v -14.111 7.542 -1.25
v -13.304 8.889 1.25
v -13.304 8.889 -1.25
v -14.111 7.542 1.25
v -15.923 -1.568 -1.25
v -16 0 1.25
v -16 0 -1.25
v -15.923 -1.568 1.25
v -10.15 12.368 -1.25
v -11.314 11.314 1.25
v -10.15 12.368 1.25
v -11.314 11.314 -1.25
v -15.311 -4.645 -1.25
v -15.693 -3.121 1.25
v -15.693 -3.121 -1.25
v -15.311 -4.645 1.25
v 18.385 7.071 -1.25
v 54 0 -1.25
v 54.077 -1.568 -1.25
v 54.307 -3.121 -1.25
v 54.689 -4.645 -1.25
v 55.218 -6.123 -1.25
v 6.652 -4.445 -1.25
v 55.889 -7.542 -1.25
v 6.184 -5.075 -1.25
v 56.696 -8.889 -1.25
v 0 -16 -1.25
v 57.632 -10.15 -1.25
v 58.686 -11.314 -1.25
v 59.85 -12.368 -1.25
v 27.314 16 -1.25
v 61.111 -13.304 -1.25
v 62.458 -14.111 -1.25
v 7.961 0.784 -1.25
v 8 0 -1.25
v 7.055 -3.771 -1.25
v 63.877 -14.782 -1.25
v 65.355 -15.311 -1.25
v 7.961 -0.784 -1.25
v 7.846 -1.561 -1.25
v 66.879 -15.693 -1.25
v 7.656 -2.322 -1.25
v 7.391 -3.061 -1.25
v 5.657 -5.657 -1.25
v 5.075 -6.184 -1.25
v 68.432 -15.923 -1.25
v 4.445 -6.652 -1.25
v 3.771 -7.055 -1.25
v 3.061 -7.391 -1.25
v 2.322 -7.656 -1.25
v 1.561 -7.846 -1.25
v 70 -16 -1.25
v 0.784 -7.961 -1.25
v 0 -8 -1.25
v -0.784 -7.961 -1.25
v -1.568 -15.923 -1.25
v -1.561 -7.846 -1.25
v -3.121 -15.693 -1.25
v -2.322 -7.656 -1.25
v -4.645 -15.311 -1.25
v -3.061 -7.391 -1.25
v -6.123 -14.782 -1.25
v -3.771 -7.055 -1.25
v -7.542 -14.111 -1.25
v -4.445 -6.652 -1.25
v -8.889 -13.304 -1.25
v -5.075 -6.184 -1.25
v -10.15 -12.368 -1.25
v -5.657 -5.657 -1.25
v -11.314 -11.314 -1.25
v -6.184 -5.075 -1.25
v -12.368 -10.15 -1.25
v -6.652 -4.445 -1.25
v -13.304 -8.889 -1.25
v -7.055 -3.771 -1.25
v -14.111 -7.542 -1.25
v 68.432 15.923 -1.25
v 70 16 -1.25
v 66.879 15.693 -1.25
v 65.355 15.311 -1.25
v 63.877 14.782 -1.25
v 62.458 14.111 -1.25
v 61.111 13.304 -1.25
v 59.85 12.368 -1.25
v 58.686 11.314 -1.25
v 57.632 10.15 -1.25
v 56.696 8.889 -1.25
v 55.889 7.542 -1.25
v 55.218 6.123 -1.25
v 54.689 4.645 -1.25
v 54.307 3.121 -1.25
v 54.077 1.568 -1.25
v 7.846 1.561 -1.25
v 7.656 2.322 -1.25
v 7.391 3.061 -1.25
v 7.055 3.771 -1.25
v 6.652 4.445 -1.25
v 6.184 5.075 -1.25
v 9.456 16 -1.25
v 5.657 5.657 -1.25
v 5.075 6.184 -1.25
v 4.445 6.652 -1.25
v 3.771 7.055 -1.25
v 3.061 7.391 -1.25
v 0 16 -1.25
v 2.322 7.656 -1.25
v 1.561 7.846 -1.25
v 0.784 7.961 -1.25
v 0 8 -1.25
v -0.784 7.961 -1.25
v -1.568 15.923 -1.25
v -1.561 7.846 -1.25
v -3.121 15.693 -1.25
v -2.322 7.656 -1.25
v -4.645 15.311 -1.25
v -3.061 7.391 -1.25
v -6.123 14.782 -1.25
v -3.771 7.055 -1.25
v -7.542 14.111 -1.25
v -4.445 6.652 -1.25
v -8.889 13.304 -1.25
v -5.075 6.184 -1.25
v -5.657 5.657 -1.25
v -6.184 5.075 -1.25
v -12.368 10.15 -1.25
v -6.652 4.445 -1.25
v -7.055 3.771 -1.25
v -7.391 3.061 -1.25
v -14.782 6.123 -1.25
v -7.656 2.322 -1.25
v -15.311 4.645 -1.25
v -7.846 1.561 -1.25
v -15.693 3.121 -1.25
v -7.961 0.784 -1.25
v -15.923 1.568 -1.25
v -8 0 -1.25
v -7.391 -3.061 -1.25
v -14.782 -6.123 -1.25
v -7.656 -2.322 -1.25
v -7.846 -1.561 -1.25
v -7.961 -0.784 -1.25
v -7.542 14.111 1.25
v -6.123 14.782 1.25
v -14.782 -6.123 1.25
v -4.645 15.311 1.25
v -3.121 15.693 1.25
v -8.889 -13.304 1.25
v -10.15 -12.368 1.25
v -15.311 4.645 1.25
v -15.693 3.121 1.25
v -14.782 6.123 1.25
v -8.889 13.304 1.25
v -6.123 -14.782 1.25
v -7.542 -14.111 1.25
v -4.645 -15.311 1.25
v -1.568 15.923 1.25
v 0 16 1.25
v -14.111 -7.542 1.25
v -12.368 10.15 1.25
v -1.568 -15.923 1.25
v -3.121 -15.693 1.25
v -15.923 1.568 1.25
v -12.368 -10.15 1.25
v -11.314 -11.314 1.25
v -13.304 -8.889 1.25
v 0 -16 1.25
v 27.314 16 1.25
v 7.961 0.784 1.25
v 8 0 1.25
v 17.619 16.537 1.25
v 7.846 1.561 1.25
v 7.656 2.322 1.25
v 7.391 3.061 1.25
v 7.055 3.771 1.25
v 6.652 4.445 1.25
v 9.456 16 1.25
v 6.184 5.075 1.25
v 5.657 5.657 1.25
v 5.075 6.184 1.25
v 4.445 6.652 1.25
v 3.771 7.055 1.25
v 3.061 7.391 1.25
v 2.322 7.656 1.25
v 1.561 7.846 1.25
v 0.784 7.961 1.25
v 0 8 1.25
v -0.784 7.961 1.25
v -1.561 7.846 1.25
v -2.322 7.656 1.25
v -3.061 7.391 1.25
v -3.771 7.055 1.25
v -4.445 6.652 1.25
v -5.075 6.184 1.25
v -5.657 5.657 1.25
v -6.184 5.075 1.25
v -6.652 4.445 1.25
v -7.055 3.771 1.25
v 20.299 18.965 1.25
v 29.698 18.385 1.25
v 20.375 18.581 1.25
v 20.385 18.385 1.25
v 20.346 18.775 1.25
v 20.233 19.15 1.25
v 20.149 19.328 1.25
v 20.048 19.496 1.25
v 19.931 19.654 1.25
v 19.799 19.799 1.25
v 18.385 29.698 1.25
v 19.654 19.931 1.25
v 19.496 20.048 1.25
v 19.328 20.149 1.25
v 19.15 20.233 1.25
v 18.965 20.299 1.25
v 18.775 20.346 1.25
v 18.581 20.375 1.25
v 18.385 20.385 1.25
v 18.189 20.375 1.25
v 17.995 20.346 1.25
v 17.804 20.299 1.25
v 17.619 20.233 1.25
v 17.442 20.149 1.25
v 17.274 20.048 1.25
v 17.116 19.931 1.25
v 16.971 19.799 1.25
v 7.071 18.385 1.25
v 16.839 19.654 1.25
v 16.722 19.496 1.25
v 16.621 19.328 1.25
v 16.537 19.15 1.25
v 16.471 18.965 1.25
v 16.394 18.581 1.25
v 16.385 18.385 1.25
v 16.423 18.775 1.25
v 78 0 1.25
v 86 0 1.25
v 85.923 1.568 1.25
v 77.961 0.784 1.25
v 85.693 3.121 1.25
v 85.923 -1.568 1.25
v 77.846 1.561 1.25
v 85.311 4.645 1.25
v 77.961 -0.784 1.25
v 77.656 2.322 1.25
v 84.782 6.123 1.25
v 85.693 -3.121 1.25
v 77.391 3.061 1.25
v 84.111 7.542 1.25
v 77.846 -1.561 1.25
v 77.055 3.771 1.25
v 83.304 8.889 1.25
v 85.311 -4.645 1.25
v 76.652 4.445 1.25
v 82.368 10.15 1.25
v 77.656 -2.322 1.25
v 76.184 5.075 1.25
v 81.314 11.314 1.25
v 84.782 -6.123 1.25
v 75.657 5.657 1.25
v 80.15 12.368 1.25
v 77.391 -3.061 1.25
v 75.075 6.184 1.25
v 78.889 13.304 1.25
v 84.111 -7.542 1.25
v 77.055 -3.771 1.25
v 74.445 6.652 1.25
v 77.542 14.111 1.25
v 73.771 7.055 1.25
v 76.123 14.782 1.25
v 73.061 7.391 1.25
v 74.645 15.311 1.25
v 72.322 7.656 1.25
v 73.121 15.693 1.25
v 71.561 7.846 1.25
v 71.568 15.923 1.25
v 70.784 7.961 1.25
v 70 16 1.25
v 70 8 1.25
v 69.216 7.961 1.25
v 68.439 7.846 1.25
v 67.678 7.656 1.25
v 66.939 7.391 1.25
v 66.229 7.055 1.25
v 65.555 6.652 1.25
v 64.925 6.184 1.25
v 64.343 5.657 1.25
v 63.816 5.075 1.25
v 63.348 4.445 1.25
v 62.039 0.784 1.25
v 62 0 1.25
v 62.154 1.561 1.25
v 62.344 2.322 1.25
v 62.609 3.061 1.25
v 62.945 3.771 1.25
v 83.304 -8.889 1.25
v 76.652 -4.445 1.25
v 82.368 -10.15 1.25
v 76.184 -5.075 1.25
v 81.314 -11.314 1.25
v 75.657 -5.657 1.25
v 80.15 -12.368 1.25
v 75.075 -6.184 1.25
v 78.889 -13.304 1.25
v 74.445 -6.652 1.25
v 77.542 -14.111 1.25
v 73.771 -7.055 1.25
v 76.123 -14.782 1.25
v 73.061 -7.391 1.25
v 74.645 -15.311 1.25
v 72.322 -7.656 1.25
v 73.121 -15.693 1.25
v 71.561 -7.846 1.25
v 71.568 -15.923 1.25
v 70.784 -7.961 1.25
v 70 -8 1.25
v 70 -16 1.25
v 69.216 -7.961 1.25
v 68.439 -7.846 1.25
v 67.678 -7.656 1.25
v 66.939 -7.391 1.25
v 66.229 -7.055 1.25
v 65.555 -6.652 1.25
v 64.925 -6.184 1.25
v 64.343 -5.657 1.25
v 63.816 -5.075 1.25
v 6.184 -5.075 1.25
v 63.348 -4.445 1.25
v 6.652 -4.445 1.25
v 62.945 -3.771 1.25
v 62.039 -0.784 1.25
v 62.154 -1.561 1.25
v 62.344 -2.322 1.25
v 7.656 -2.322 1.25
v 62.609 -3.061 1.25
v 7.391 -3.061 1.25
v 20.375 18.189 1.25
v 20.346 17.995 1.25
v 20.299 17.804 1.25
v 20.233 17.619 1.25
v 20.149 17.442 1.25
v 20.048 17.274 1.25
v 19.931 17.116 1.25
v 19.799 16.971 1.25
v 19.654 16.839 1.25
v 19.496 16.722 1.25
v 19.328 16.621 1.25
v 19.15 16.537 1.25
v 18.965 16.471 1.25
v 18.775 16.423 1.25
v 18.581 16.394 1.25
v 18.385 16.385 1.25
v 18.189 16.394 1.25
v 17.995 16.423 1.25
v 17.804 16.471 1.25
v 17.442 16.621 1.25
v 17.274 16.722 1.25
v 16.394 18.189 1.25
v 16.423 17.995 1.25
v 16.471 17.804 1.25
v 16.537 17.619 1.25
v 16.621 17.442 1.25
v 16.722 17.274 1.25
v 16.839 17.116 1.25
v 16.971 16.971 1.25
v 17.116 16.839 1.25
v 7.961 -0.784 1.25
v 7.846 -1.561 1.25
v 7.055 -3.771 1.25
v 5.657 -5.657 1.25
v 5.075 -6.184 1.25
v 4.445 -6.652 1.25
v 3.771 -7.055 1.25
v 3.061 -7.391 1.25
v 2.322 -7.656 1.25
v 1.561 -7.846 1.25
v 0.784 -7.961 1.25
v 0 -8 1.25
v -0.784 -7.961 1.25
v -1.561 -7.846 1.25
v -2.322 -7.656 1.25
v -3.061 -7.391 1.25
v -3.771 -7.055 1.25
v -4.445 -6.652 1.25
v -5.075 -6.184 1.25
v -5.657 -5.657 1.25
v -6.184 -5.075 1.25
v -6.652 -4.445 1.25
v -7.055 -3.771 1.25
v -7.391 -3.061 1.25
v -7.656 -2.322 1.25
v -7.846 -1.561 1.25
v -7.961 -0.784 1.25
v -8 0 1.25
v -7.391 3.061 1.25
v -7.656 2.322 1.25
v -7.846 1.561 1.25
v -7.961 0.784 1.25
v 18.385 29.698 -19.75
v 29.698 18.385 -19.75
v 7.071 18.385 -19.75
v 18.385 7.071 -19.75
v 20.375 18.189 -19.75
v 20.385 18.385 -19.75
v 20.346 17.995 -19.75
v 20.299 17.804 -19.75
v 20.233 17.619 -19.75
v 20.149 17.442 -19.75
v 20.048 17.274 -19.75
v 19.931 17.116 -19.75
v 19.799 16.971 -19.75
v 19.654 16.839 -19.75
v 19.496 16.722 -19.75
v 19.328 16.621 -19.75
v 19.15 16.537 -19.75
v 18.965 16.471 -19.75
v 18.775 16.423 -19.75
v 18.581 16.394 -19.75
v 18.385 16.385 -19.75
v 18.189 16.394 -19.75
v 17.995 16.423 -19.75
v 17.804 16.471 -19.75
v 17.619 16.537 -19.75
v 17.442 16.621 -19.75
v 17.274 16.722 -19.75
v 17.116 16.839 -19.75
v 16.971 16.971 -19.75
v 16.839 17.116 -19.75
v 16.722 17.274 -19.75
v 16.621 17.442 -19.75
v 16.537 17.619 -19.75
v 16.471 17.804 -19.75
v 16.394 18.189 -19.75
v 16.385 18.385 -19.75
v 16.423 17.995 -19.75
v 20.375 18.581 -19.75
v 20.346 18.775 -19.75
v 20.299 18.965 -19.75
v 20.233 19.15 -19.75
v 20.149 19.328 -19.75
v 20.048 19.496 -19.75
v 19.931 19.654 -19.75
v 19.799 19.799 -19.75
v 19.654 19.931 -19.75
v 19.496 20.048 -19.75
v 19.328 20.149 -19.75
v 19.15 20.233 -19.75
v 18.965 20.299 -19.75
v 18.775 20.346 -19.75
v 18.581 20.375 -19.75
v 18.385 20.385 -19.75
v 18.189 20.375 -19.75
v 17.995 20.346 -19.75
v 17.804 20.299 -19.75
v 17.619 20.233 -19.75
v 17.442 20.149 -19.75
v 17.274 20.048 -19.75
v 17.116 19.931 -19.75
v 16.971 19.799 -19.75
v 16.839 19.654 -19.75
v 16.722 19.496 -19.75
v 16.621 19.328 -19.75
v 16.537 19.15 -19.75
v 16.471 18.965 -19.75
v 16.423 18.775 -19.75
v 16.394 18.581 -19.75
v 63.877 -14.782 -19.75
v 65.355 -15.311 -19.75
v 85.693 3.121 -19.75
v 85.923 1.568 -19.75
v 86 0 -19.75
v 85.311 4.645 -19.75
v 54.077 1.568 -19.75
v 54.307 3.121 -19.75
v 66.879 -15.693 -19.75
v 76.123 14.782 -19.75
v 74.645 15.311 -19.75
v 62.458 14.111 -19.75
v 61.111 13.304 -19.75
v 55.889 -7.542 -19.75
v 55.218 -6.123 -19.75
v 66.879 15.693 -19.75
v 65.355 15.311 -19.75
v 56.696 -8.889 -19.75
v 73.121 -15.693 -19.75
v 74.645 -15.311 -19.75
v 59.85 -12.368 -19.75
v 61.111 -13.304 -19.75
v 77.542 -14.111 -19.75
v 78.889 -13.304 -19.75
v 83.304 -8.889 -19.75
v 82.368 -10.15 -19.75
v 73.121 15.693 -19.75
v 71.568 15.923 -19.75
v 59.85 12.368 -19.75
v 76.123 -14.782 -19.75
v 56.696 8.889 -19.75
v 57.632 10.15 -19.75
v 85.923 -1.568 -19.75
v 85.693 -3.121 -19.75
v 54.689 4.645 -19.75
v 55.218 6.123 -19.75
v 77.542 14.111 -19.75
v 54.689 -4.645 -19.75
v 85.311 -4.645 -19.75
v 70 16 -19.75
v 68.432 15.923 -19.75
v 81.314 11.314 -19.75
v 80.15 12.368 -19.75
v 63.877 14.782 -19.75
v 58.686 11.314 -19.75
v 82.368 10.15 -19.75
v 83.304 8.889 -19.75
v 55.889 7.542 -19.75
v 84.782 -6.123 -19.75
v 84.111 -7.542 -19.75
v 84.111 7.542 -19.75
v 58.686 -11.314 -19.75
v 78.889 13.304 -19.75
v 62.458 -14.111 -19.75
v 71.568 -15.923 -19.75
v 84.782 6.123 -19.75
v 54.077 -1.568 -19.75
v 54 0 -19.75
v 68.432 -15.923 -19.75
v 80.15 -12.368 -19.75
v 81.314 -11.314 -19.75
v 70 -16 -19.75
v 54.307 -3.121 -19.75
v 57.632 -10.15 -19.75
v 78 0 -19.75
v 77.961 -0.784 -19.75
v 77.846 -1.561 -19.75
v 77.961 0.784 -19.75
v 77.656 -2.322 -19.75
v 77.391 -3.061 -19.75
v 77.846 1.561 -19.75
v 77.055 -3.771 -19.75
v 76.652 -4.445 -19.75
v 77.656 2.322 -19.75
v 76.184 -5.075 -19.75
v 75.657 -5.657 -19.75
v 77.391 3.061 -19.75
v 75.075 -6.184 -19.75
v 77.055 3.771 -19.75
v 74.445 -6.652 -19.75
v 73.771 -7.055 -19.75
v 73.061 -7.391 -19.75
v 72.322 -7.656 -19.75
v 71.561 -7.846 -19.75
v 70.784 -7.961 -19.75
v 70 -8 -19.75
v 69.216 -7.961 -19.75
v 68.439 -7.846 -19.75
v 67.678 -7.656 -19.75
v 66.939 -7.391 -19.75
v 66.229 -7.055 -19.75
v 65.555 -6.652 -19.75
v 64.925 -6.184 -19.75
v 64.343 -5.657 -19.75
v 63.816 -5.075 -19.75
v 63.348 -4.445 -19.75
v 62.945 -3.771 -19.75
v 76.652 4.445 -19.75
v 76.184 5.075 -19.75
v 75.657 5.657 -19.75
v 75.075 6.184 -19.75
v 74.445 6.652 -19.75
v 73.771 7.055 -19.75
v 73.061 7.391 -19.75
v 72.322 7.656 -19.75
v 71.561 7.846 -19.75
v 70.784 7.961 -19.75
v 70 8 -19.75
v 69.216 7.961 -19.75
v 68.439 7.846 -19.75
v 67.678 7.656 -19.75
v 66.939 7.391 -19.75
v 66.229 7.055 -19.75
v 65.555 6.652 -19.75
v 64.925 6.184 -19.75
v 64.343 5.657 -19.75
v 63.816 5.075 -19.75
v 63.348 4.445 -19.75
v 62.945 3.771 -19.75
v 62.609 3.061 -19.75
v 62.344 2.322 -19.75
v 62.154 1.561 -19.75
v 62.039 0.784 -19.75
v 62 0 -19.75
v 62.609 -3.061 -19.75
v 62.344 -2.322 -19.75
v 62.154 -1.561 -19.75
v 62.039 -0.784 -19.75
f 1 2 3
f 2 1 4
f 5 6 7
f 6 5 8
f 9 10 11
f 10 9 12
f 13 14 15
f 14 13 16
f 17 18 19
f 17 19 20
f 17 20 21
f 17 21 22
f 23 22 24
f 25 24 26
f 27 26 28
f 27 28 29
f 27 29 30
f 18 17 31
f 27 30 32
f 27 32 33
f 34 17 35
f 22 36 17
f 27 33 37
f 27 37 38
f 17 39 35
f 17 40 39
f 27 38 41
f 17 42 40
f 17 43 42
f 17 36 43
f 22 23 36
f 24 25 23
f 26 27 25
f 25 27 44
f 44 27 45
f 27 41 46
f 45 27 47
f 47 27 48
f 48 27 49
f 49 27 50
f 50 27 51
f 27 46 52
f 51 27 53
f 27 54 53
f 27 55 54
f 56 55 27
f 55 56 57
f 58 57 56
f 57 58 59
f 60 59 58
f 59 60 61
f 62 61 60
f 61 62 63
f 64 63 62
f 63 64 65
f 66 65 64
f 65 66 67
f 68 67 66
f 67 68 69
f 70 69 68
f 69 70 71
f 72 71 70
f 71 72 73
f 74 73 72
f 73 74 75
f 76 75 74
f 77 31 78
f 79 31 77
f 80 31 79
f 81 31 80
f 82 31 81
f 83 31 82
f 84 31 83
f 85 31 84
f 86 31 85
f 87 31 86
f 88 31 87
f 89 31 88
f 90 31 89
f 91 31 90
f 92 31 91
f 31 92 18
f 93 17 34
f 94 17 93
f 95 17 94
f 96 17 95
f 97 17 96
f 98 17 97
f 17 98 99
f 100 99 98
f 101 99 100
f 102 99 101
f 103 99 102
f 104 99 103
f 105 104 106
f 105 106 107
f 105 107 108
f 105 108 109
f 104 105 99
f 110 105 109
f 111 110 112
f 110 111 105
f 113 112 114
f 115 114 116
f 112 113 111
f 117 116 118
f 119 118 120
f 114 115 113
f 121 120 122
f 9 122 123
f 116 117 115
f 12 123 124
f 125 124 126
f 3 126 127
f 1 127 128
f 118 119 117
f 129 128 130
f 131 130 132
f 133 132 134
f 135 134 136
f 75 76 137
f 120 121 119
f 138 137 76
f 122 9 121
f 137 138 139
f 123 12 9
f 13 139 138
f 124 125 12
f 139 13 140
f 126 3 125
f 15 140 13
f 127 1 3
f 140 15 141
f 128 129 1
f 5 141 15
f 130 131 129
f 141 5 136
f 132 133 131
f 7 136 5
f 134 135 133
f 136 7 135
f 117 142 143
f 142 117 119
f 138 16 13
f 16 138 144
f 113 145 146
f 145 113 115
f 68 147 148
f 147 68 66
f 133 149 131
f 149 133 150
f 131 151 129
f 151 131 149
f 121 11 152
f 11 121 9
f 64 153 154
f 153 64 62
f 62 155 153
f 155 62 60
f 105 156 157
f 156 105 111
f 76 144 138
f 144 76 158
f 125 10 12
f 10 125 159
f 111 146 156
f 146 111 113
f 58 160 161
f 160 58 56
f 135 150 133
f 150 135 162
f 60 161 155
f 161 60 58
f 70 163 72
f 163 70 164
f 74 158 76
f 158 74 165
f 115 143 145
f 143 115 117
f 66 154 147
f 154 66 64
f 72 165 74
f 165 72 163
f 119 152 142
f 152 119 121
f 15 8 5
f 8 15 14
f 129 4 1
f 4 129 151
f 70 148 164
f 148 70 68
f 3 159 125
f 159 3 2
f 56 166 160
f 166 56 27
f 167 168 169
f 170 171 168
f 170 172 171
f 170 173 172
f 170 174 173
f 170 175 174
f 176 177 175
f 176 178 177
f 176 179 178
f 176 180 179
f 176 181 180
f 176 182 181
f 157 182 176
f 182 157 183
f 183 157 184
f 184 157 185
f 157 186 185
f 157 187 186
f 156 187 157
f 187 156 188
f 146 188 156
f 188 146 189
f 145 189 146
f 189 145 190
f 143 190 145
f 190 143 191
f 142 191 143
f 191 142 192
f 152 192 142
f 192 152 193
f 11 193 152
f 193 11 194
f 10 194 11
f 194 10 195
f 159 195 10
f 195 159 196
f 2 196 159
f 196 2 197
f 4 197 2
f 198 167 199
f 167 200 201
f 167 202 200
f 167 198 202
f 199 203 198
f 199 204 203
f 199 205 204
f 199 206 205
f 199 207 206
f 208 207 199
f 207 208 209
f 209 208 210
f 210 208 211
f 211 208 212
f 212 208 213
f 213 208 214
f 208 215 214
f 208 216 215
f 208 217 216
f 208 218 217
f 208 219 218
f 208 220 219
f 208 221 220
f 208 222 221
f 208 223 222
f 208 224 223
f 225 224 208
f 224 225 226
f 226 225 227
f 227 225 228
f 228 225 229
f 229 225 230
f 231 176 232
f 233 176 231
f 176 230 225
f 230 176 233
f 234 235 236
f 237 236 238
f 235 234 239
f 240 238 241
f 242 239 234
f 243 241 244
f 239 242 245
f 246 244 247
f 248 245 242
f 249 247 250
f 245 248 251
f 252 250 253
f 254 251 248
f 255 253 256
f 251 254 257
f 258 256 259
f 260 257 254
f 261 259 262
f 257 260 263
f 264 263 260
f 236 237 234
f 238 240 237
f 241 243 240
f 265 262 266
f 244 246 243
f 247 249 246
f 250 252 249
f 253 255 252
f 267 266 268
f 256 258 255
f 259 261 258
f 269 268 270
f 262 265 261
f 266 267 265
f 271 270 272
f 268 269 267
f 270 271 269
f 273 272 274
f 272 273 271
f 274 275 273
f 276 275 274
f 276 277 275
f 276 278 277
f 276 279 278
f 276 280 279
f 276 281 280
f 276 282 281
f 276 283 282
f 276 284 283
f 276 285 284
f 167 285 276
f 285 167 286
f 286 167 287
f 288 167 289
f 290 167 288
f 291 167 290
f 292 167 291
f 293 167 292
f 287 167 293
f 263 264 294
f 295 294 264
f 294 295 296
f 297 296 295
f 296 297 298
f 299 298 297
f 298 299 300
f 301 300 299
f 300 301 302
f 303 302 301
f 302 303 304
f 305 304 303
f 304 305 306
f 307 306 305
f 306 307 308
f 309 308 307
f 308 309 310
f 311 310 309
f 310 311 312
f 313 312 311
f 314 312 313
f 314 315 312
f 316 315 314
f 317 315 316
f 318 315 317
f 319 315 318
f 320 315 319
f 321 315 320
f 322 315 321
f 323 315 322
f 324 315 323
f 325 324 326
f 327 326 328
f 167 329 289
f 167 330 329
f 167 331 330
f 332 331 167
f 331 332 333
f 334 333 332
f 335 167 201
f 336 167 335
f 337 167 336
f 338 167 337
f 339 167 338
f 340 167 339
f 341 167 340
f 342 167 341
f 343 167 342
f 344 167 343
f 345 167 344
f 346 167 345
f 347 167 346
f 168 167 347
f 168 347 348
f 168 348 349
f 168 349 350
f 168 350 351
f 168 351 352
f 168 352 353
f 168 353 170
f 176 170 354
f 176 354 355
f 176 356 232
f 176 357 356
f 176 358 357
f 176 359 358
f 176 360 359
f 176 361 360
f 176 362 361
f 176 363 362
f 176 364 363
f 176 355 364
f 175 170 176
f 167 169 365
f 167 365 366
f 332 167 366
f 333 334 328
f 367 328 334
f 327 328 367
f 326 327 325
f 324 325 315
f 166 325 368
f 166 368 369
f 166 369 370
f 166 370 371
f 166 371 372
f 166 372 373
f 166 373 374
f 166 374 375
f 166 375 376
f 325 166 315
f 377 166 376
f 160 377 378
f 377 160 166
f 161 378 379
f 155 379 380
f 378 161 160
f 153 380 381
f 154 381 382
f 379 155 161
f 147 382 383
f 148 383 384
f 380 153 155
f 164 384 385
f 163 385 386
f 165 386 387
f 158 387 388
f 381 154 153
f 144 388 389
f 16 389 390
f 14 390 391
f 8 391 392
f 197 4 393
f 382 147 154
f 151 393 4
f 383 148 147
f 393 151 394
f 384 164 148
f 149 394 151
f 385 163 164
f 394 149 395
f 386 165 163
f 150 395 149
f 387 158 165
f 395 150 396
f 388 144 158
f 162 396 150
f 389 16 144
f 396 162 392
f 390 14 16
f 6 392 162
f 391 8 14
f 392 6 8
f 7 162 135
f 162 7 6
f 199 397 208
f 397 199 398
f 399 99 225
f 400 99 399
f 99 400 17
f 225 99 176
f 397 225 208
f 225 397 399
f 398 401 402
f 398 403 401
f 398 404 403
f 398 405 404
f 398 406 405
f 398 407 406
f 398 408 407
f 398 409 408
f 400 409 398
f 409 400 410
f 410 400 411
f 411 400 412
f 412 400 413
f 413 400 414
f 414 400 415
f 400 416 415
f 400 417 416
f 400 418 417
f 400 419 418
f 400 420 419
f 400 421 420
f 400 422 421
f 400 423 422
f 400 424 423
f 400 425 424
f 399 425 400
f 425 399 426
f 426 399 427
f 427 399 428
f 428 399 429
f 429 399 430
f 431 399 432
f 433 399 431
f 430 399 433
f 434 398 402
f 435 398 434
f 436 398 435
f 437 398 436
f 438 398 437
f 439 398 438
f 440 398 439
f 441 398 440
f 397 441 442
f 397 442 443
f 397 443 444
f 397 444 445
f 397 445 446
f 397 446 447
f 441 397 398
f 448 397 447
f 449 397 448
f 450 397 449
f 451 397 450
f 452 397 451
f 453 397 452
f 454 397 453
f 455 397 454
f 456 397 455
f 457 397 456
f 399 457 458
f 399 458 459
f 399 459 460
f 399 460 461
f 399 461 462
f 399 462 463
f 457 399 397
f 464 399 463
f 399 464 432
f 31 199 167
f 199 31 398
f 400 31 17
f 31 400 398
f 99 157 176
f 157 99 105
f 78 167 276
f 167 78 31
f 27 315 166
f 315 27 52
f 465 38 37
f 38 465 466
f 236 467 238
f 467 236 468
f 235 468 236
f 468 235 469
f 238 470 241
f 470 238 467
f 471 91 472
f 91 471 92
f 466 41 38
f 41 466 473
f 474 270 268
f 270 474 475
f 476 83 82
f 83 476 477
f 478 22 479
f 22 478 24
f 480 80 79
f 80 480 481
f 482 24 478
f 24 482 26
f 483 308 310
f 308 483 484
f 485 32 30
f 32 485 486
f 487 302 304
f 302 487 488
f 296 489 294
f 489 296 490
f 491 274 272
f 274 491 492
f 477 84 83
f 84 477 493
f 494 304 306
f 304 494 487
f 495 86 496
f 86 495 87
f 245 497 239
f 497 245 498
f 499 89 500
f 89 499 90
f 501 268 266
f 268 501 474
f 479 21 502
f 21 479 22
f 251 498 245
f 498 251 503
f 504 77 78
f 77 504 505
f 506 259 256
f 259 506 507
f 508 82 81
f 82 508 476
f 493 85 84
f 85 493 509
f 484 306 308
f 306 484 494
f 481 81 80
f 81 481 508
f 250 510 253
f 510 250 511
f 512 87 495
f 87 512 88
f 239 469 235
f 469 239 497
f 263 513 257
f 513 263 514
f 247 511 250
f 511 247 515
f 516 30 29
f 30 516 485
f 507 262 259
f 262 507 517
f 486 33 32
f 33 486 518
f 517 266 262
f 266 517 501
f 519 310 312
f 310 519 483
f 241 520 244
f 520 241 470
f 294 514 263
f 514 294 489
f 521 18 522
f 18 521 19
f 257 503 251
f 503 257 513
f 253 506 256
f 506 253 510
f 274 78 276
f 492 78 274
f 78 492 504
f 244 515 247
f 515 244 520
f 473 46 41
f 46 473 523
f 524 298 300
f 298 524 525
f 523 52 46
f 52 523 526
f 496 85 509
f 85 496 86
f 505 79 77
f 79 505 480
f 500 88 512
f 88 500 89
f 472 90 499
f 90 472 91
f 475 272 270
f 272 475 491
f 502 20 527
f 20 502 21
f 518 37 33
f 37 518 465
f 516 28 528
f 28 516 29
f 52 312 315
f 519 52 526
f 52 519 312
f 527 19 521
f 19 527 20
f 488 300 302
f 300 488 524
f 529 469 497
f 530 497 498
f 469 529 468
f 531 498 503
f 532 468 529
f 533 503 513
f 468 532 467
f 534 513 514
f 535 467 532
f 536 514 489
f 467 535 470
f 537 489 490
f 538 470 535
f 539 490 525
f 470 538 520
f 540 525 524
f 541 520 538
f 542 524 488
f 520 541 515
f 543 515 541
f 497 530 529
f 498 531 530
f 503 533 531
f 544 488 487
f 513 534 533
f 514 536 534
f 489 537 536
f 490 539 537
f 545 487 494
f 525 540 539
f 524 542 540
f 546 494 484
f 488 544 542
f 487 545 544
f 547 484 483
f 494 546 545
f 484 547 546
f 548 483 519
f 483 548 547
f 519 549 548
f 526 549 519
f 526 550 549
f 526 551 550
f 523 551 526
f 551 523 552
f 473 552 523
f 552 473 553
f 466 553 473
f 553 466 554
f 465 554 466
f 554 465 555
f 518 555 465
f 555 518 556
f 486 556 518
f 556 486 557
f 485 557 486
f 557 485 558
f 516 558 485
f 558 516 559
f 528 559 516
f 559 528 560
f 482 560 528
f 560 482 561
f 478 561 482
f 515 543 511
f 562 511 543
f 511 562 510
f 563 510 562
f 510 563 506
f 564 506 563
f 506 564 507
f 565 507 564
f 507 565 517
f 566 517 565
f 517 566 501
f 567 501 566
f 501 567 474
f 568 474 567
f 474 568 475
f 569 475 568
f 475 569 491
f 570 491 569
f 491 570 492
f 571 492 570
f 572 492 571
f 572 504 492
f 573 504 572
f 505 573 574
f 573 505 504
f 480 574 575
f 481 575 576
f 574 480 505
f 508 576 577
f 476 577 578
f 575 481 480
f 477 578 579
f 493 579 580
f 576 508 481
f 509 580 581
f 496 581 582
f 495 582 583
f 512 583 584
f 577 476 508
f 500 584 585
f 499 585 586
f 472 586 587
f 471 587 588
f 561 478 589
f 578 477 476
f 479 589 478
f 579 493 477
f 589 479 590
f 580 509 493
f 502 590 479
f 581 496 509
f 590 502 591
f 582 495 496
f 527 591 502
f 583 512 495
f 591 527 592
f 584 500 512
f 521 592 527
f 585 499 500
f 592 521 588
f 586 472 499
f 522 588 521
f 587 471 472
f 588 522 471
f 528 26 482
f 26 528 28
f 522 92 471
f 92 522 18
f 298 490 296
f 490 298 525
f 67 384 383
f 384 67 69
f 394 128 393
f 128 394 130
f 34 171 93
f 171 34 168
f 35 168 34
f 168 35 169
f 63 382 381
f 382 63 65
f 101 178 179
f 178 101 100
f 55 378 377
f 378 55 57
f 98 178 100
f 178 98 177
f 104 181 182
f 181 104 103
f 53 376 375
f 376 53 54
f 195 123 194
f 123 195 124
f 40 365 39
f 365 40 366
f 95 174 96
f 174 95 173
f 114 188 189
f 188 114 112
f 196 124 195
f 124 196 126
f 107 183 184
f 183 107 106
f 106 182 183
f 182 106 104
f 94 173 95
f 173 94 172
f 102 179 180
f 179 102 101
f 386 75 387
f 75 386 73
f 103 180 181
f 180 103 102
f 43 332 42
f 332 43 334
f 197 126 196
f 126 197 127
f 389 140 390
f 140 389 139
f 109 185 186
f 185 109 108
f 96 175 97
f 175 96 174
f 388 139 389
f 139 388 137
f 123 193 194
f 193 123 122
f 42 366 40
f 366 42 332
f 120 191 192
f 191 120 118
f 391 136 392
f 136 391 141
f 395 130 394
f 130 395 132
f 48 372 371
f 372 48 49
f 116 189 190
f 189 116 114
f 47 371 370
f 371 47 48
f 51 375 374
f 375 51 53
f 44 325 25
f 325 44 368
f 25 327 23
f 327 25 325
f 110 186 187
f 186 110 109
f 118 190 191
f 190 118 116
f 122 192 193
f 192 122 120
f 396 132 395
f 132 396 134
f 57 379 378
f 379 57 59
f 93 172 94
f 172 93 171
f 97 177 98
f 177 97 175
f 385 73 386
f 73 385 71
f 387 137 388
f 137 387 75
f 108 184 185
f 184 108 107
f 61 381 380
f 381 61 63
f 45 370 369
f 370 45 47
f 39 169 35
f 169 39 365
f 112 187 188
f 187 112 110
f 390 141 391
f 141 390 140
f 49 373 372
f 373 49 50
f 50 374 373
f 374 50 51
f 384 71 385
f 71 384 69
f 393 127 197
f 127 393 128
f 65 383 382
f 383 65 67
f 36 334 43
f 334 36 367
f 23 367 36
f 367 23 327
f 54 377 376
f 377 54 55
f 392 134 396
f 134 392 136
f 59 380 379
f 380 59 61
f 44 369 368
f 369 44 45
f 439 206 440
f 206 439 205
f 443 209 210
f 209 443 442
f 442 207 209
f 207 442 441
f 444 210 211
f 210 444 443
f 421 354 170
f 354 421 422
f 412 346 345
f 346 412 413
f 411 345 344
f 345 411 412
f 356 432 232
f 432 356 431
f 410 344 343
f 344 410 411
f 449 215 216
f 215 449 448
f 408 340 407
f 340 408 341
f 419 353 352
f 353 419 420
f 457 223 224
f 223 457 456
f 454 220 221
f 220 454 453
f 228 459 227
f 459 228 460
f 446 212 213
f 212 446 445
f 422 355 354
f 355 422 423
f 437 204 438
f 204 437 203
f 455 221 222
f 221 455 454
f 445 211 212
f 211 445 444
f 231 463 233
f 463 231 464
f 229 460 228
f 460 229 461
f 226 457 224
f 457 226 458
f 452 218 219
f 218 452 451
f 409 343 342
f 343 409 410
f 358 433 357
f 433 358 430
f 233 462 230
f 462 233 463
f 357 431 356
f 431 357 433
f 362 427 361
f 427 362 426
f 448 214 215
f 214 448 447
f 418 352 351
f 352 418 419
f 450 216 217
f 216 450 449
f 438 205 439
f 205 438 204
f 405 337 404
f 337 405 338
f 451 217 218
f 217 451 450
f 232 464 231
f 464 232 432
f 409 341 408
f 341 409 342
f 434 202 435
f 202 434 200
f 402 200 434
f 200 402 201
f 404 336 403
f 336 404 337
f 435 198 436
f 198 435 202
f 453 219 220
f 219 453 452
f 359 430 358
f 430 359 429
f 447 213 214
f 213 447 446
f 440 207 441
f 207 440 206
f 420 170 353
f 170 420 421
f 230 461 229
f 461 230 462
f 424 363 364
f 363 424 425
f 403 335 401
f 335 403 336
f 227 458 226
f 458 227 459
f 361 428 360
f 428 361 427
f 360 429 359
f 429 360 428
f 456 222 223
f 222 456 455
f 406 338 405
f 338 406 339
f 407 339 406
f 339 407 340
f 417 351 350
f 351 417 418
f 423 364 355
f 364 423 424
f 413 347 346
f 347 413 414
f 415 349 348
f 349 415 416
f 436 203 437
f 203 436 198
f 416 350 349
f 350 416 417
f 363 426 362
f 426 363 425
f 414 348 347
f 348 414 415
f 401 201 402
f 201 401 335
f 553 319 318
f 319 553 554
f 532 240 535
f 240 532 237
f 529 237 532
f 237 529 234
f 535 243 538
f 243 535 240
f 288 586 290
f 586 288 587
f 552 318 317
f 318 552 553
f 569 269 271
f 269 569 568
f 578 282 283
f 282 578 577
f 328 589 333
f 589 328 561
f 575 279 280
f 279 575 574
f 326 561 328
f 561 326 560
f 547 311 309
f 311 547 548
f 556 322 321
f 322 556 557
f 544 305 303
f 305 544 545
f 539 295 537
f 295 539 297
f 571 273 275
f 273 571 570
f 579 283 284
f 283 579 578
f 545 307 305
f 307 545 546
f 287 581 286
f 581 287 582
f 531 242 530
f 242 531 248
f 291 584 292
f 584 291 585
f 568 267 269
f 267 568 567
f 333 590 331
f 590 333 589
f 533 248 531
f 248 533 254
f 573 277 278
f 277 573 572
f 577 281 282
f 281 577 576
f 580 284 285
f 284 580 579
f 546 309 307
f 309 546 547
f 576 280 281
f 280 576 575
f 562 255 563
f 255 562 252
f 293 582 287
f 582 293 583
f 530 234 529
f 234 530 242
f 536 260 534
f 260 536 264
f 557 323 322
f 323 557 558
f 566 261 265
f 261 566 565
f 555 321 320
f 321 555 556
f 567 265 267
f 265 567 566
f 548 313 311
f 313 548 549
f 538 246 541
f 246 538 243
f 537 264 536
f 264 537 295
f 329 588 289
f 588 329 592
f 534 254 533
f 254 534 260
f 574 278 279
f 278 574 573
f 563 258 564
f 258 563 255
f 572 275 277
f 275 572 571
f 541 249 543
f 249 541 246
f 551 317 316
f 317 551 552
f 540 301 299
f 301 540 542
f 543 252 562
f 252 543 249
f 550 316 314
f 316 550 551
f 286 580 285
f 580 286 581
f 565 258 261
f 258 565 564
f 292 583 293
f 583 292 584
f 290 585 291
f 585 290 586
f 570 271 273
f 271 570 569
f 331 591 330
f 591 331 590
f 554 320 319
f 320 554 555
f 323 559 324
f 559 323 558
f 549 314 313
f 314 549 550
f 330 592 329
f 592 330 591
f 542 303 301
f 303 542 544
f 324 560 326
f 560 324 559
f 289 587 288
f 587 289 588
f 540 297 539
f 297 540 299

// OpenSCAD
move_rod =  70;
other_thick = 8; // left side   should  be thicker. 
thick = 2.5;
rod_diameter  = 16;

outer_rod_diameter = 26;

plate_width = rod_diameter * 2;

old_thick = 42 / 2; // this thick is the original holder. 



difference() {
  translate([- rod_diameter * 1.5, - rod_diameter * 1.5, 0]){
    translate([rod_diameter * 1.5, rod_diameter * 1.5, 0]) {
      cylinder(h=thick, d = plate_width, center=true, $fn=64);

      rotate(a = [0, 0, 45]) {
        translate([outer_rod_diameter, 0, - (old_thick / 2) + thick / 2]) {
          cube(size = [rod_diameter, rod_diameter, old_thick], center = true);
        }
      }
    }
    translate([move_rod / 2 + rod_diameter * 1.5, rod_diameter * 1.5, 0]) {
      cube(size = [move_rod, plate_width, thick], center = true);
    }
    translate([rod_diameter * 1.5 + move_rod, rod_diameter * 1.5, - (old_thick / 2) + thick / 2]) {
      cylinder(h=old_thick, d = plate_width, center=true, $fn=64);
    }
  }
  translate([- rod_diameter * 1.5, - rod_diameter * 1.5, 0]){
    translate([rod_diameter * 1.5, rod_diameter * 1.5, old_thick / 2]) {
      # cylinder(h=old_thick * 2, d = rod_diameter, center=true, $fn=64);
      rotate(a = [0, 0, 45]) {
        translate([outer_rod_diameter, 0, old_thick / 2 - thick / 2]) {
          translate([0, 0, - old_thick]) {
#cylinder(h = old_thick*4, d = rod_diameter / 4, center = true, $fn=64);
          }
        }
      }
    }
    translate([rod_diameter * 1.5 + move_rod, rod_diameter * 1.5, - old_thick / 2]) {
     # cylinder(h=old_thick * 2, d = rod_diameter, center=true, $fn=64);
    }
  }
}
